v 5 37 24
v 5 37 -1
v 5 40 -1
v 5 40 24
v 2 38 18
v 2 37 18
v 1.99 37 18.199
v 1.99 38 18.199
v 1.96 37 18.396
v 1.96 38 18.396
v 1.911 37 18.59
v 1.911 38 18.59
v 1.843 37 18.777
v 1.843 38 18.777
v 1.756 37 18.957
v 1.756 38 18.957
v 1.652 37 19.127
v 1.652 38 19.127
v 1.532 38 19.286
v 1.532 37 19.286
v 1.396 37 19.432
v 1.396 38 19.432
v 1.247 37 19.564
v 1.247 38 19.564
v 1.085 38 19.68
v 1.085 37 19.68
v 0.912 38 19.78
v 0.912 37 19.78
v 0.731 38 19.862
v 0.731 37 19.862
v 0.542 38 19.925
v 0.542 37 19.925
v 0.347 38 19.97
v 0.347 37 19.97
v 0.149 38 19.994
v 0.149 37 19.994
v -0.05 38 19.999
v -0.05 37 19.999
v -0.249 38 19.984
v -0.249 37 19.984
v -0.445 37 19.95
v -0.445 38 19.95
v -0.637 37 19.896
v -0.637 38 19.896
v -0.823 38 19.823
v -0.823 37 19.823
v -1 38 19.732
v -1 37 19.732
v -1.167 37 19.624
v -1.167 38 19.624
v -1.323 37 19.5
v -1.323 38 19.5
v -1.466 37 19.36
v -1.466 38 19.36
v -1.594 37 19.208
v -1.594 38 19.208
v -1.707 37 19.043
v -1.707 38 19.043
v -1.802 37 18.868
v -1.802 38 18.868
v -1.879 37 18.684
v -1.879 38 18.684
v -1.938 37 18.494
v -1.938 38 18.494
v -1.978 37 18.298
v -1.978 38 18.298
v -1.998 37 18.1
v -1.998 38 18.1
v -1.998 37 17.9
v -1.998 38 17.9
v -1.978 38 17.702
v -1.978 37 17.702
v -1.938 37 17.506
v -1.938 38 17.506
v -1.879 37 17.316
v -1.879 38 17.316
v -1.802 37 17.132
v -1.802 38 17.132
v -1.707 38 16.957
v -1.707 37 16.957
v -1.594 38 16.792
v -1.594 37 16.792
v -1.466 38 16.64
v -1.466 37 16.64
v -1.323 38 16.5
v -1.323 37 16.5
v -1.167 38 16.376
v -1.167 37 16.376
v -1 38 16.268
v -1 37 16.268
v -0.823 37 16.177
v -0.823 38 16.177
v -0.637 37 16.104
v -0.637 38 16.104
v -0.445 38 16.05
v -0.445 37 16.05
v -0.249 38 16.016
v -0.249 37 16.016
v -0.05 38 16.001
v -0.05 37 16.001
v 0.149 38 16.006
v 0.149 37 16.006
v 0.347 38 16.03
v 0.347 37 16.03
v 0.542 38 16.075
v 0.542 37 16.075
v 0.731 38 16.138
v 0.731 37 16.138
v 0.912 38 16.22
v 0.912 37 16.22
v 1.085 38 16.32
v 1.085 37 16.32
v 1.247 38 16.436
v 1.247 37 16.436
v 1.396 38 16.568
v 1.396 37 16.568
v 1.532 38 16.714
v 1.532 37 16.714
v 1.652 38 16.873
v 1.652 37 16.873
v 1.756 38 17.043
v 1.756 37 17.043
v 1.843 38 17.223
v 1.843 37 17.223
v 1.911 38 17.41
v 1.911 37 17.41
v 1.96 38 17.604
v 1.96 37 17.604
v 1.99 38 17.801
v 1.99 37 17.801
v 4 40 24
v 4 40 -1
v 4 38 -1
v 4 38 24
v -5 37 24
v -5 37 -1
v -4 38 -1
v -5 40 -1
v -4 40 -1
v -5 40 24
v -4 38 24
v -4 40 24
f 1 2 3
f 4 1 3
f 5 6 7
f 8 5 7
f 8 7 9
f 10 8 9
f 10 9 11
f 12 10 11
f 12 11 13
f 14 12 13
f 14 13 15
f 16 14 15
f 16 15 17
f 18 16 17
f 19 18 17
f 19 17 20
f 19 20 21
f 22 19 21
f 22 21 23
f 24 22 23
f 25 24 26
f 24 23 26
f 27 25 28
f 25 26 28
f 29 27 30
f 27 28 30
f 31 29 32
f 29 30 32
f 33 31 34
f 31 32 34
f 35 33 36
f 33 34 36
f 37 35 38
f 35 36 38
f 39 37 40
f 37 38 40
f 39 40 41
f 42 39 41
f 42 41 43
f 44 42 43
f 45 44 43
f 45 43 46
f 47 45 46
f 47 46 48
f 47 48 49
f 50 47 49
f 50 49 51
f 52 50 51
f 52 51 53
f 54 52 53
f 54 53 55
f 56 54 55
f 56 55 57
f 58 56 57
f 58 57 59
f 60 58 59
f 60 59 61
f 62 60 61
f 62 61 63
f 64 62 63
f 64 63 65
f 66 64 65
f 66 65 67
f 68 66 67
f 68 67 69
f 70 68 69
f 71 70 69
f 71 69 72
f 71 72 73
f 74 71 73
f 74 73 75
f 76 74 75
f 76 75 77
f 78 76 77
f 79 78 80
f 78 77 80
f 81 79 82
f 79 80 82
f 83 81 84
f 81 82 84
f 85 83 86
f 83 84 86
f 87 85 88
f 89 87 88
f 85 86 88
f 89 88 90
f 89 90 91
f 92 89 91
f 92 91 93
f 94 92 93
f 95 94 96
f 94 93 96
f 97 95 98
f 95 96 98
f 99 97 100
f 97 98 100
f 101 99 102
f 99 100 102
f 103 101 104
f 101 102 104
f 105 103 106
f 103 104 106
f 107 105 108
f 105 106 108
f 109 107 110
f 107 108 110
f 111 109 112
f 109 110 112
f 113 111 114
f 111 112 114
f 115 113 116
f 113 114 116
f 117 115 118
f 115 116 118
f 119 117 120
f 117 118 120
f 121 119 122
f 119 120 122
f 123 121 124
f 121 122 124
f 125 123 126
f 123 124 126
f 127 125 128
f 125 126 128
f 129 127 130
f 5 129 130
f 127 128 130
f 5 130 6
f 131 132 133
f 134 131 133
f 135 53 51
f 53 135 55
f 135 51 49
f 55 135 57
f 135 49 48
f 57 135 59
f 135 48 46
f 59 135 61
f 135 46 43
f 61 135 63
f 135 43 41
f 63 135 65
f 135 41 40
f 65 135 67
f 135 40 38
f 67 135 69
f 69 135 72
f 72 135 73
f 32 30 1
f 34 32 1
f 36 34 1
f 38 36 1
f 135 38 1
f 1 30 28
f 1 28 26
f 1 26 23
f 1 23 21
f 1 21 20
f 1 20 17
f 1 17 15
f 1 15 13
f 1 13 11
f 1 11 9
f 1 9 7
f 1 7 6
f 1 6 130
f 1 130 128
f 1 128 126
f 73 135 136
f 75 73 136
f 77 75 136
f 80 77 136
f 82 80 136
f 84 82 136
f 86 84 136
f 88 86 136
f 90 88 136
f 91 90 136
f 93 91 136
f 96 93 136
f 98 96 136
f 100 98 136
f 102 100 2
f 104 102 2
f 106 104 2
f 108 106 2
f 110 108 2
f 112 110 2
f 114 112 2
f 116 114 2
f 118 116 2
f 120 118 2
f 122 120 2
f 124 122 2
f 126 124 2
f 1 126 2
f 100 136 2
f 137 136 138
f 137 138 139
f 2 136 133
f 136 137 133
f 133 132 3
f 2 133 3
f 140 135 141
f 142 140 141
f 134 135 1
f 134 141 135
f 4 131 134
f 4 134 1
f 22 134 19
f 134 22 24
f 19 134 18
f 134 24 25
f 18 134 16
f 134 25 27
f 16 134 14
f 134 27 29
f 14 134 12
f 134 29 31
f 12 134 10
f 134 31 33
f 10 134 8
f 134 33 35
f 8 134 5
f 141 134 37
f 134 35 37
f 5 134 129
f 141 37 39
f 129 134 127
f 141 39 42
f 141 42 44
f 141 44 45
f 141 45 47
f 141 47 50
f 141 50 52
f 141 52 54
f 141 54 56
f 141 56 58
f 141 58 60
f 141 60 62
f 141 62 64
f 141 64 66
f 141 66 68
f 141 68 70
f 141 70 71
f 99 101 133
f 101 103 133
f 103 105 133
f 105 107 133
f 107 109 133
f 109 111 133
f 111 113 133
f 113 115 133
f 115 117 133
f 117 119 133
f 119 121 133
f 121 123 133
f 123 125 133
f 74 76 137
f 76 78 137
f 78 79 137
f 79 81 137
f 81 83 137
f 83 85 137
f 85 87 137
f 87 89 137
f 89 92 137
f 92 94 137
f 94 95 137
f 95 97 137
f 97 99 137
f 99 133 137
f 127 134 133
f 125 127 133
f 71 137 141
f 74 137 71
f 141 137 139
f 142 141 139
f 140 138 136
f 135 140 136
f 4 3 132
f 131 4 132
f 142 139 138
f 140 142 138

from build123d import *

# Parameters (mm, degrees)
SKETCH052_R      = 2
EXTRUDE049_DEPTH = 5
EXTRUDE048_DEPTH = 25


with BuildPart() as extrude049:
    # Sketch052 → Extrude049 (new body)
    with BuildSketch(Plane.XZ.offset(-35)):
        with Locations((0, 18)):
            Circle(SKETCH052_R)
    extrude(amount=-EXTRUDE049_DEPTH)


with BuildPart() as hook:
    # Sketch051 → Extrude048 (new body)
    with BuildSketch(Plane.XY.offset(-1)):
        Polygon((-5, 40), (-5, 37), (5, 37), (5, 40), (4, 40), (4, 38), (-4, 38), (-4, 40), align=None)
    extrude(amount=EXTRUDE048_DEPTH)

    # Cut041: cut Extrude049
    add(extrude049.part, mode=Mode.SUBTRACT)


solid = hook.part
